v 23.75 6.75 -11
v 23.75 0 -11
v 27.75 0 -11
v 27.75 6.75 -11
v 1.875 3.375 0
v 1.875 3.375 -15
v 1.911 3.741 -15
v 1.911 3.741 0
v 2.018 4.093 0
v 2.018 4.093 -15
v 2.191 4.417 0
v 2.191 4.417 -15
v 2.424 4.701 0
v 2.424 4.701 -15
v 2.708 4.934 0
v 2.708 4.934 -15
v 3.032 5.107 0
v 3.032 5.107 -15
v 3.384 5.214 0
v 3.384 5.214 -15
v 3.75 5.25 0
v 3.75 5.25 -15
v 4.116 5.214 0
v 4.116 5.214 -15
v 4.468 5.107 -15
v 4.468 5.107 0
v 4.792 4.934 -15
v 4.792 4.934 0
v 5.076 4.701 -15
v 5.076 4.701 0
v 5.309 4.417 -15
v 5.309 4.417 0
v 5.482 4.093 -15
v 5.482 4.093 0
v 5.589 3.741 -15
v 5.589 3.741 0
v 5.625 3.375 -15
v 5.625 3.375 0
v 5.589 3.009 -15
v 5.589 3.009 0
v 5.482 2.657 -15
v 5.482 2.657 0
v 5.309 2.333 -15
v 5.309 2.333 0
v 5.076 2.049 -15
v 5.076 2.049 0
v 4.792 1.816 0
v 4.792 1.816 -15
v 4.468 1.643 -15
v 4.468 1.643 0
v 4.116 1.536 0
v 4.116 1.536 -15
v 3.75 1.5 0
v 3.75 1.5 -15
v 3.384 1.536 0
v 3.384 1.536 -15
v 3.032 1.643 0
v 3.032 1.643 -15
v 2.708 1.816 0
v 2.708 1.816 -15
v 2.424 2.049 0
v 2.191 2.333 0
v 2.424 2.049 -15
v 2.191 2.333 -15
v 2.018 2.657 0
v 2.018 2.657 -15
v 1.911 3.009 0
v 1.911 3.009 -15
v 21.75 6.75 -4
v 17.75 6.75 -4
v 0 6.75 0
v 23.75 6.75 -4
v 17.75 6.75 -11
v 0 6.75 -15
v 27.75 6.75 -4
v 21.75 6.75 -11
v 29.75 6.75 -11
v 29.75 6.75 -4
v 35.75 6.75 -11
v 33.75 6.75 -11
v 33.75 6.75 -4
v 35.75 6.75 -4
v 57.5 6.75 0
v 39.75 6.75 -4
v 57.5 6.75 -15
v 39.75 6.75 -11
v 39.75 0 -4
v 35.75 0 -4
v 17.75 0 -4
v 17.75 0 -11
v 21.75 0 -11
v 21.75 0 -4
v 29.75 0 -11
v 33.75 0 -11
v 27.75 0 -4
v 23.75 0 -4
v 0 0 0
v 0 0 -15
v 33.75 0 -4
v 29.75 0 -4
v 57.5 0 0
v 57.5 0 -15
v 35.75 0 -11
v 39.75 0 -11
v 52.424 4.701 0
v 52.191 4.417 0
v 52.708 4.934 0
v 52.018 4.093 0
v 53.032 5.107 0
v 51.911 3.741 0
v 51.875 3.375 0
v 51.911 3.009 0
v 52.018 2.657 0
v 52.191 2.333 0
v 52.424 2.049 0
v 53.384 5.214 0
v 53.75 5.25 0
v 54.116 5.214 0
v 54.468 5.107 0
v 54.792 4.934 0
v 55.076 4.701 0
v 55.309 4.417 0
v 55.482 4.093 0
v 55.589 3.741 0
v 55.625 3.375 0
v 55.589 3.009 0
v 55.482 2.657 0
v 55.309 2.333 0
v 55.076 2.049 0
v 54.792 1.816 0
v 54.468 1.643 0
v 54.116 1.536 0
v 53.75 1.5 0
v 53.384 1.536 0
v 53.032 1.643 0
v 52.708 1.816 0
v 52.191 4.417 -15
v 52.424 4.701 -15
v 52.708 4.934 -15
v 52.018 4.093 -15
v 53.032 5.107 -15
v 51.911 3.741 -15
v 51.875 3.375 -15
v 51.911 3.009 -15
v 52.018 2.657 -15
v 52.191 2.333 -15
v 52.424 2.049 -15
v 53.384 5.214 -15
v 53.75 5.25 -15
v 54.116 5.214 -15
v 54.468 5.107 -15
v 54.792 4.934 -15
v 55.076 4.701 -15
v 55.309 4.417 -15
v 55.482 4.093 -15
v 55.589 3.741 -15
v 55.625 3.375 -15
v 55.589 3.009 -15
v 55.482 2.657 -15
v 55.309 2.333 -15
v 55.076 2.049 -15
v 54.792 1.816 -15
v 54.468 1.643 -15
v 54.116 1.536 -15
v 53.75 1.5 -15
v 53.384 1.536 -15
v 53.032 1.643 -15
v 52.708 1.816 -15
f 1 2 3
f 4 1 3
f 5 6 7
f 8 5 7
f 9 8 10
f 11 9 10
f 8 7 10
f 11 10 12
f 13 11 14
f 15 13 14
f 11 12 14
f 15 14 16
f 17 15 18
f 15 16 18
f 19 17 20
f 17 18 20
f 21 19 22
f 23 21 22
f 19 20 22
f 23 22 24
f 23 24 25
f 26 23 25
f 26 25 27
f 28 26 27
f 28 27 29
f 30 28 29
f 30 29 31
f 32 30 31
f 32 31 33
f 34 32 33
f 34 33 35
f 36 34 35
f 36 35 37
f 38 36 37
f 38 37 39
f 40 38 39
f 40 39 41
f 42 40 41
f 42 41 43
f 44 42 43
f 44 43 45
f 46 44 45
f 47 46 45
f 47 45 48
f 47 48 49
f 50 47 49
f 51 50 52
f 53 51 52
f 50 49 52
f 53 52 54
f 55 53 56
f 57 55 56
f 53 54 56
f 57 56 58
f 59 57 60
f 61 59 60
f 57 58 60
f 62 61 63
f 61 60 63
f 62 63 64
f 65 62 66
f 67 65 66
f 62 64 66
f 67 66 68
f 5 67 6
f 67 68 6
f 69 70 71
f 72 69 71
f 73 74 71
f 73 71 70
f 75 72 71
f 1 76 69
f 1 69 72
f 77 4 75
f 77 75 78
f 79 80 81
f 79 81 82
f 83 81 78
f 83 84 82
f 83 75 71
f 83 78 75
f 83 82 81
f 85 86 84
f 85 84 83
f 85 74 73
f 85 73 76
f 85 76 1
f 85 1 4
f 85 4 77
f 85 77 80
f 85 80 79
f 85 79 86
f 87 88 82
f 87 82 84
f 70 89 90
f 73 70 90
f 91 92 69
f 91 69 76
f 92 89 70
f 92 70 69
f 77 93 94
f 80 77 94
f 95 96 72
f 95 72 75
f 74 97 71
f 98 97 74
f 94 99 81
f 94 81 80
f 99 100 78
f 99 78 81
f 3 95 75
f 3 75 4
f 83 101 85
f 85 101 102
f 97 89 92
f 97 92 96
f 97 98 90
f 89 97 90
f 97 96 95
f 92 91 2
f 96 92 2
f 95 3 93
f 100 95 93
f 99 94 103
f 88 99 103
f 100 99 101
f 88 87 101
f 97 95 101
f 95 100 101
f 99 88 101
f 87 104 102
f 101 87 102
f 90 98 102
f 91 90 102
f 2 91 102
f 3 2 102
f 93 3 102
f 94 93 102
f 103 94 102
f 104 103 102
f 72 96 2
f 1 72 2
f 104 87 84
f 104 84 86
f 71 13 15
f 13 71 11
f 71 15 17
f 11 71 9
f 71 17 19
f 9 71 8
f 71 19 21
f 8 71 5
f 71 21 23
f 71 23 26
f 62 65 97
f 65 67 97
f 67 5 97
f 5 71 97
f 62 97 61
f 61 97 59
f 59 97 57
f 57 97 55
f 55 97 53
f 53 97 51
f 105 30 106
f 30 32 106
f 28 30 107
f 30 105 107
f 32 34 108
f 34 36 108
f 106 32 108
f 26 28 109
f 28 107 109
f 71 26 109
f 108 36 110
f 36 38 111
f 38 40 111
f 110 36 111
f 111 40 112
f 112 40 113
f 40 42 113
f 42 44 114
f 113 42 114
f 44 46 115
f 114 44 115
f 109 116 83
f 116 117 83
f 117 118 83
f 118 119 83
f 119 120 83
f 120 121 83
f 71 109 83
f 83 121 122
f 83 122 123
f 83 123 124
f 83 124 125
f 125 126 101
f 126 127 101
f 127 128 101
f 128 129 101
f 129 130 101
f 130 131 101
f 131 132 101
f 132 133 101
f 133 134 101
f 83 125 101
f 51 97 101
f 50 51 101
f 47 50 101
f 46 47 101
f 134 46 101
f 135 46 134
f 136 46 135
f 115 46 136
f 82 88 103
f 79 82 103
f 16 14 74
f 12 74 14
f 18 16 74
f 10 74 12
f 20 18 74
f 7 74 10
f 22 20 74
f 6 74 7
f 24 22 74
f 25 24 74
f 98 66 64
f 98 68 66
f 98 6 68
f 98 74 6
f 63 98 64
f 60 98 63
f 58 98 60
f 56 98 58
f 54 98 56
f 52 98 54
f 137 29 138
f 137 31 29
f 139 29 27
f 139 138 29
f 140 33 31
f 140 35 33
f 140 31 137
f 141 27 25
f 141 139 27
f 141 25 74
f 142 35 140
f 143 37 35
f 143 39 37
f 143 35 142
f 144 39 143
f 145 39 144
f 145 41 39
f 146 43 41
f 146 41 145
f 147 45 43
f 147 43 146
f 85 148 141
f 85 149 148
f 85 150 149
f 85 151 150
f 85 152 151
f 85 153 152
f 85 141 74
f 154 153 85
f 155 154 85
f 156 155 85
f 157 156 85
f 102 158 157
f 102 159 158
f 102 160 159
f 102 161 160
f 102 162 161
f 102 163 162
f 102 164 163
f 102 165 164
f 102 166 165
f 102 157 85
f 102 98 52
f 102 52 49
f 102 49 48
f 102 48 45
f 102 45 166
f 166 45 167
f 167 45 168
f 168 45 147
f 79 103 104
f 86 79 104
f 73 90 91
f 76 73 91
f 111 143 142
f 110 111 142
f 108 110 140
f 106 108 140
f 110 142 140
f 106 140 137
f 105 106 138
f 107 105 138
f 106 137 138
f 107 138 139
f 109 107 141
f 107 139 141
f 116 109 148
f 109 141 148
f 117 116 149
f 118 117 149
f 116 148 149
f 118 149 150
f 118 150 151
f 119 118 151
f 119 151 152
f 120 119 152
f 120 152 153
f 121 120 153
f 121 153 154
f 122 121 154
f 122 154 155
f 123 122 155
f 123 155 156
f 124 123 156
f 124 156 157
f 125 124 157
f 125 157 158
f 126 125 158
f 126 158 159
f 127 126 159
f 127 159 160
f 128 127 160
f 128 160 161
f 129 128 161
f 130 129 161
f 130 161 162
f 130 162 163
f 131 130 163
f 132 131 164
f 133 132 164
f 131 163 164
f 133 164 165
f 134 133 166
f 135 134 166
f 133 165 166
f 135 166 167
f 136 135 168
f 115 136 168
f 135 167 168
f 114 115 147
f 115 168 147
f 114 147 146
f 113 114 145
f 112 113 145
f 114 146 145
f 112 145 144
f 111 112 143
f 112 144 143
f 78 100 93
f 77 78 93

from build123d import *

# Parameters (mm, degrees)
SKETCH1_W           = 57.5
SKETCH1_H           = 15
SKETCH1_W_2         = 4
SKETCH1_H_2         = 7
BOSS_EXTRUDE1_DEPTH = 6.75
SKETCH2_R           = 1.875
CUT_EXTRUDE1_DEPTH  = 60.806458681


with BuildPart() as part:
    # Sketch1 → Boss-Extrude1 (new body)
    with BuildSketch(Plane(origin=(0, 0, 0), x_dir=(1, 0, 0), z_dir=(0, 1, 0))):
        with Locations((28.75, 7.5)):
            Rectangle(SKETCH1_W, SKETCH1_H)
        with Locations((19.75, 7.5)):
            Rectangle(SKETCH1_W_2, SKETCH1_H_2, mode=Mode.SUBTRACT)
        with Locations((25.75, 7.5)):
            Rectangle(SKETCH1_W_2, SKETCH1_H_2, mode=Mode.SUBTRACT)
        with Locations((31.75, 7.5)):
            Rectangle(SKETCH1_W_2, SKETCH1_H_2, mode=Mode.SUBTRACT)
        with Locations((37.75, 7.5)):
            Rectangle(SKETCH1_W_2, SKETCH1_H_2, mode=Mode.SUBTRACT)
    extrude(amount=BOSS_EXTRUDE1_DEPTH)

    # Sketch2 → Cut-Extrude1 (cut, through all)
    with BuildSketch(Plane(origin=(0, 0, -15), x_dir=(-1, 0, 0), z_dir=(0, 0, -1))):
        with Locations((-53.75, 3.375)):
            Circle(SKETCH2_R)
        with Locations((-3.75, 3.375)):
            Circle(SKETCH2_R)
    extrude(amount=-CUT_EXTRUDE1_DEPTH, mode=Mode.SUBTRACT)


solid = part.part
